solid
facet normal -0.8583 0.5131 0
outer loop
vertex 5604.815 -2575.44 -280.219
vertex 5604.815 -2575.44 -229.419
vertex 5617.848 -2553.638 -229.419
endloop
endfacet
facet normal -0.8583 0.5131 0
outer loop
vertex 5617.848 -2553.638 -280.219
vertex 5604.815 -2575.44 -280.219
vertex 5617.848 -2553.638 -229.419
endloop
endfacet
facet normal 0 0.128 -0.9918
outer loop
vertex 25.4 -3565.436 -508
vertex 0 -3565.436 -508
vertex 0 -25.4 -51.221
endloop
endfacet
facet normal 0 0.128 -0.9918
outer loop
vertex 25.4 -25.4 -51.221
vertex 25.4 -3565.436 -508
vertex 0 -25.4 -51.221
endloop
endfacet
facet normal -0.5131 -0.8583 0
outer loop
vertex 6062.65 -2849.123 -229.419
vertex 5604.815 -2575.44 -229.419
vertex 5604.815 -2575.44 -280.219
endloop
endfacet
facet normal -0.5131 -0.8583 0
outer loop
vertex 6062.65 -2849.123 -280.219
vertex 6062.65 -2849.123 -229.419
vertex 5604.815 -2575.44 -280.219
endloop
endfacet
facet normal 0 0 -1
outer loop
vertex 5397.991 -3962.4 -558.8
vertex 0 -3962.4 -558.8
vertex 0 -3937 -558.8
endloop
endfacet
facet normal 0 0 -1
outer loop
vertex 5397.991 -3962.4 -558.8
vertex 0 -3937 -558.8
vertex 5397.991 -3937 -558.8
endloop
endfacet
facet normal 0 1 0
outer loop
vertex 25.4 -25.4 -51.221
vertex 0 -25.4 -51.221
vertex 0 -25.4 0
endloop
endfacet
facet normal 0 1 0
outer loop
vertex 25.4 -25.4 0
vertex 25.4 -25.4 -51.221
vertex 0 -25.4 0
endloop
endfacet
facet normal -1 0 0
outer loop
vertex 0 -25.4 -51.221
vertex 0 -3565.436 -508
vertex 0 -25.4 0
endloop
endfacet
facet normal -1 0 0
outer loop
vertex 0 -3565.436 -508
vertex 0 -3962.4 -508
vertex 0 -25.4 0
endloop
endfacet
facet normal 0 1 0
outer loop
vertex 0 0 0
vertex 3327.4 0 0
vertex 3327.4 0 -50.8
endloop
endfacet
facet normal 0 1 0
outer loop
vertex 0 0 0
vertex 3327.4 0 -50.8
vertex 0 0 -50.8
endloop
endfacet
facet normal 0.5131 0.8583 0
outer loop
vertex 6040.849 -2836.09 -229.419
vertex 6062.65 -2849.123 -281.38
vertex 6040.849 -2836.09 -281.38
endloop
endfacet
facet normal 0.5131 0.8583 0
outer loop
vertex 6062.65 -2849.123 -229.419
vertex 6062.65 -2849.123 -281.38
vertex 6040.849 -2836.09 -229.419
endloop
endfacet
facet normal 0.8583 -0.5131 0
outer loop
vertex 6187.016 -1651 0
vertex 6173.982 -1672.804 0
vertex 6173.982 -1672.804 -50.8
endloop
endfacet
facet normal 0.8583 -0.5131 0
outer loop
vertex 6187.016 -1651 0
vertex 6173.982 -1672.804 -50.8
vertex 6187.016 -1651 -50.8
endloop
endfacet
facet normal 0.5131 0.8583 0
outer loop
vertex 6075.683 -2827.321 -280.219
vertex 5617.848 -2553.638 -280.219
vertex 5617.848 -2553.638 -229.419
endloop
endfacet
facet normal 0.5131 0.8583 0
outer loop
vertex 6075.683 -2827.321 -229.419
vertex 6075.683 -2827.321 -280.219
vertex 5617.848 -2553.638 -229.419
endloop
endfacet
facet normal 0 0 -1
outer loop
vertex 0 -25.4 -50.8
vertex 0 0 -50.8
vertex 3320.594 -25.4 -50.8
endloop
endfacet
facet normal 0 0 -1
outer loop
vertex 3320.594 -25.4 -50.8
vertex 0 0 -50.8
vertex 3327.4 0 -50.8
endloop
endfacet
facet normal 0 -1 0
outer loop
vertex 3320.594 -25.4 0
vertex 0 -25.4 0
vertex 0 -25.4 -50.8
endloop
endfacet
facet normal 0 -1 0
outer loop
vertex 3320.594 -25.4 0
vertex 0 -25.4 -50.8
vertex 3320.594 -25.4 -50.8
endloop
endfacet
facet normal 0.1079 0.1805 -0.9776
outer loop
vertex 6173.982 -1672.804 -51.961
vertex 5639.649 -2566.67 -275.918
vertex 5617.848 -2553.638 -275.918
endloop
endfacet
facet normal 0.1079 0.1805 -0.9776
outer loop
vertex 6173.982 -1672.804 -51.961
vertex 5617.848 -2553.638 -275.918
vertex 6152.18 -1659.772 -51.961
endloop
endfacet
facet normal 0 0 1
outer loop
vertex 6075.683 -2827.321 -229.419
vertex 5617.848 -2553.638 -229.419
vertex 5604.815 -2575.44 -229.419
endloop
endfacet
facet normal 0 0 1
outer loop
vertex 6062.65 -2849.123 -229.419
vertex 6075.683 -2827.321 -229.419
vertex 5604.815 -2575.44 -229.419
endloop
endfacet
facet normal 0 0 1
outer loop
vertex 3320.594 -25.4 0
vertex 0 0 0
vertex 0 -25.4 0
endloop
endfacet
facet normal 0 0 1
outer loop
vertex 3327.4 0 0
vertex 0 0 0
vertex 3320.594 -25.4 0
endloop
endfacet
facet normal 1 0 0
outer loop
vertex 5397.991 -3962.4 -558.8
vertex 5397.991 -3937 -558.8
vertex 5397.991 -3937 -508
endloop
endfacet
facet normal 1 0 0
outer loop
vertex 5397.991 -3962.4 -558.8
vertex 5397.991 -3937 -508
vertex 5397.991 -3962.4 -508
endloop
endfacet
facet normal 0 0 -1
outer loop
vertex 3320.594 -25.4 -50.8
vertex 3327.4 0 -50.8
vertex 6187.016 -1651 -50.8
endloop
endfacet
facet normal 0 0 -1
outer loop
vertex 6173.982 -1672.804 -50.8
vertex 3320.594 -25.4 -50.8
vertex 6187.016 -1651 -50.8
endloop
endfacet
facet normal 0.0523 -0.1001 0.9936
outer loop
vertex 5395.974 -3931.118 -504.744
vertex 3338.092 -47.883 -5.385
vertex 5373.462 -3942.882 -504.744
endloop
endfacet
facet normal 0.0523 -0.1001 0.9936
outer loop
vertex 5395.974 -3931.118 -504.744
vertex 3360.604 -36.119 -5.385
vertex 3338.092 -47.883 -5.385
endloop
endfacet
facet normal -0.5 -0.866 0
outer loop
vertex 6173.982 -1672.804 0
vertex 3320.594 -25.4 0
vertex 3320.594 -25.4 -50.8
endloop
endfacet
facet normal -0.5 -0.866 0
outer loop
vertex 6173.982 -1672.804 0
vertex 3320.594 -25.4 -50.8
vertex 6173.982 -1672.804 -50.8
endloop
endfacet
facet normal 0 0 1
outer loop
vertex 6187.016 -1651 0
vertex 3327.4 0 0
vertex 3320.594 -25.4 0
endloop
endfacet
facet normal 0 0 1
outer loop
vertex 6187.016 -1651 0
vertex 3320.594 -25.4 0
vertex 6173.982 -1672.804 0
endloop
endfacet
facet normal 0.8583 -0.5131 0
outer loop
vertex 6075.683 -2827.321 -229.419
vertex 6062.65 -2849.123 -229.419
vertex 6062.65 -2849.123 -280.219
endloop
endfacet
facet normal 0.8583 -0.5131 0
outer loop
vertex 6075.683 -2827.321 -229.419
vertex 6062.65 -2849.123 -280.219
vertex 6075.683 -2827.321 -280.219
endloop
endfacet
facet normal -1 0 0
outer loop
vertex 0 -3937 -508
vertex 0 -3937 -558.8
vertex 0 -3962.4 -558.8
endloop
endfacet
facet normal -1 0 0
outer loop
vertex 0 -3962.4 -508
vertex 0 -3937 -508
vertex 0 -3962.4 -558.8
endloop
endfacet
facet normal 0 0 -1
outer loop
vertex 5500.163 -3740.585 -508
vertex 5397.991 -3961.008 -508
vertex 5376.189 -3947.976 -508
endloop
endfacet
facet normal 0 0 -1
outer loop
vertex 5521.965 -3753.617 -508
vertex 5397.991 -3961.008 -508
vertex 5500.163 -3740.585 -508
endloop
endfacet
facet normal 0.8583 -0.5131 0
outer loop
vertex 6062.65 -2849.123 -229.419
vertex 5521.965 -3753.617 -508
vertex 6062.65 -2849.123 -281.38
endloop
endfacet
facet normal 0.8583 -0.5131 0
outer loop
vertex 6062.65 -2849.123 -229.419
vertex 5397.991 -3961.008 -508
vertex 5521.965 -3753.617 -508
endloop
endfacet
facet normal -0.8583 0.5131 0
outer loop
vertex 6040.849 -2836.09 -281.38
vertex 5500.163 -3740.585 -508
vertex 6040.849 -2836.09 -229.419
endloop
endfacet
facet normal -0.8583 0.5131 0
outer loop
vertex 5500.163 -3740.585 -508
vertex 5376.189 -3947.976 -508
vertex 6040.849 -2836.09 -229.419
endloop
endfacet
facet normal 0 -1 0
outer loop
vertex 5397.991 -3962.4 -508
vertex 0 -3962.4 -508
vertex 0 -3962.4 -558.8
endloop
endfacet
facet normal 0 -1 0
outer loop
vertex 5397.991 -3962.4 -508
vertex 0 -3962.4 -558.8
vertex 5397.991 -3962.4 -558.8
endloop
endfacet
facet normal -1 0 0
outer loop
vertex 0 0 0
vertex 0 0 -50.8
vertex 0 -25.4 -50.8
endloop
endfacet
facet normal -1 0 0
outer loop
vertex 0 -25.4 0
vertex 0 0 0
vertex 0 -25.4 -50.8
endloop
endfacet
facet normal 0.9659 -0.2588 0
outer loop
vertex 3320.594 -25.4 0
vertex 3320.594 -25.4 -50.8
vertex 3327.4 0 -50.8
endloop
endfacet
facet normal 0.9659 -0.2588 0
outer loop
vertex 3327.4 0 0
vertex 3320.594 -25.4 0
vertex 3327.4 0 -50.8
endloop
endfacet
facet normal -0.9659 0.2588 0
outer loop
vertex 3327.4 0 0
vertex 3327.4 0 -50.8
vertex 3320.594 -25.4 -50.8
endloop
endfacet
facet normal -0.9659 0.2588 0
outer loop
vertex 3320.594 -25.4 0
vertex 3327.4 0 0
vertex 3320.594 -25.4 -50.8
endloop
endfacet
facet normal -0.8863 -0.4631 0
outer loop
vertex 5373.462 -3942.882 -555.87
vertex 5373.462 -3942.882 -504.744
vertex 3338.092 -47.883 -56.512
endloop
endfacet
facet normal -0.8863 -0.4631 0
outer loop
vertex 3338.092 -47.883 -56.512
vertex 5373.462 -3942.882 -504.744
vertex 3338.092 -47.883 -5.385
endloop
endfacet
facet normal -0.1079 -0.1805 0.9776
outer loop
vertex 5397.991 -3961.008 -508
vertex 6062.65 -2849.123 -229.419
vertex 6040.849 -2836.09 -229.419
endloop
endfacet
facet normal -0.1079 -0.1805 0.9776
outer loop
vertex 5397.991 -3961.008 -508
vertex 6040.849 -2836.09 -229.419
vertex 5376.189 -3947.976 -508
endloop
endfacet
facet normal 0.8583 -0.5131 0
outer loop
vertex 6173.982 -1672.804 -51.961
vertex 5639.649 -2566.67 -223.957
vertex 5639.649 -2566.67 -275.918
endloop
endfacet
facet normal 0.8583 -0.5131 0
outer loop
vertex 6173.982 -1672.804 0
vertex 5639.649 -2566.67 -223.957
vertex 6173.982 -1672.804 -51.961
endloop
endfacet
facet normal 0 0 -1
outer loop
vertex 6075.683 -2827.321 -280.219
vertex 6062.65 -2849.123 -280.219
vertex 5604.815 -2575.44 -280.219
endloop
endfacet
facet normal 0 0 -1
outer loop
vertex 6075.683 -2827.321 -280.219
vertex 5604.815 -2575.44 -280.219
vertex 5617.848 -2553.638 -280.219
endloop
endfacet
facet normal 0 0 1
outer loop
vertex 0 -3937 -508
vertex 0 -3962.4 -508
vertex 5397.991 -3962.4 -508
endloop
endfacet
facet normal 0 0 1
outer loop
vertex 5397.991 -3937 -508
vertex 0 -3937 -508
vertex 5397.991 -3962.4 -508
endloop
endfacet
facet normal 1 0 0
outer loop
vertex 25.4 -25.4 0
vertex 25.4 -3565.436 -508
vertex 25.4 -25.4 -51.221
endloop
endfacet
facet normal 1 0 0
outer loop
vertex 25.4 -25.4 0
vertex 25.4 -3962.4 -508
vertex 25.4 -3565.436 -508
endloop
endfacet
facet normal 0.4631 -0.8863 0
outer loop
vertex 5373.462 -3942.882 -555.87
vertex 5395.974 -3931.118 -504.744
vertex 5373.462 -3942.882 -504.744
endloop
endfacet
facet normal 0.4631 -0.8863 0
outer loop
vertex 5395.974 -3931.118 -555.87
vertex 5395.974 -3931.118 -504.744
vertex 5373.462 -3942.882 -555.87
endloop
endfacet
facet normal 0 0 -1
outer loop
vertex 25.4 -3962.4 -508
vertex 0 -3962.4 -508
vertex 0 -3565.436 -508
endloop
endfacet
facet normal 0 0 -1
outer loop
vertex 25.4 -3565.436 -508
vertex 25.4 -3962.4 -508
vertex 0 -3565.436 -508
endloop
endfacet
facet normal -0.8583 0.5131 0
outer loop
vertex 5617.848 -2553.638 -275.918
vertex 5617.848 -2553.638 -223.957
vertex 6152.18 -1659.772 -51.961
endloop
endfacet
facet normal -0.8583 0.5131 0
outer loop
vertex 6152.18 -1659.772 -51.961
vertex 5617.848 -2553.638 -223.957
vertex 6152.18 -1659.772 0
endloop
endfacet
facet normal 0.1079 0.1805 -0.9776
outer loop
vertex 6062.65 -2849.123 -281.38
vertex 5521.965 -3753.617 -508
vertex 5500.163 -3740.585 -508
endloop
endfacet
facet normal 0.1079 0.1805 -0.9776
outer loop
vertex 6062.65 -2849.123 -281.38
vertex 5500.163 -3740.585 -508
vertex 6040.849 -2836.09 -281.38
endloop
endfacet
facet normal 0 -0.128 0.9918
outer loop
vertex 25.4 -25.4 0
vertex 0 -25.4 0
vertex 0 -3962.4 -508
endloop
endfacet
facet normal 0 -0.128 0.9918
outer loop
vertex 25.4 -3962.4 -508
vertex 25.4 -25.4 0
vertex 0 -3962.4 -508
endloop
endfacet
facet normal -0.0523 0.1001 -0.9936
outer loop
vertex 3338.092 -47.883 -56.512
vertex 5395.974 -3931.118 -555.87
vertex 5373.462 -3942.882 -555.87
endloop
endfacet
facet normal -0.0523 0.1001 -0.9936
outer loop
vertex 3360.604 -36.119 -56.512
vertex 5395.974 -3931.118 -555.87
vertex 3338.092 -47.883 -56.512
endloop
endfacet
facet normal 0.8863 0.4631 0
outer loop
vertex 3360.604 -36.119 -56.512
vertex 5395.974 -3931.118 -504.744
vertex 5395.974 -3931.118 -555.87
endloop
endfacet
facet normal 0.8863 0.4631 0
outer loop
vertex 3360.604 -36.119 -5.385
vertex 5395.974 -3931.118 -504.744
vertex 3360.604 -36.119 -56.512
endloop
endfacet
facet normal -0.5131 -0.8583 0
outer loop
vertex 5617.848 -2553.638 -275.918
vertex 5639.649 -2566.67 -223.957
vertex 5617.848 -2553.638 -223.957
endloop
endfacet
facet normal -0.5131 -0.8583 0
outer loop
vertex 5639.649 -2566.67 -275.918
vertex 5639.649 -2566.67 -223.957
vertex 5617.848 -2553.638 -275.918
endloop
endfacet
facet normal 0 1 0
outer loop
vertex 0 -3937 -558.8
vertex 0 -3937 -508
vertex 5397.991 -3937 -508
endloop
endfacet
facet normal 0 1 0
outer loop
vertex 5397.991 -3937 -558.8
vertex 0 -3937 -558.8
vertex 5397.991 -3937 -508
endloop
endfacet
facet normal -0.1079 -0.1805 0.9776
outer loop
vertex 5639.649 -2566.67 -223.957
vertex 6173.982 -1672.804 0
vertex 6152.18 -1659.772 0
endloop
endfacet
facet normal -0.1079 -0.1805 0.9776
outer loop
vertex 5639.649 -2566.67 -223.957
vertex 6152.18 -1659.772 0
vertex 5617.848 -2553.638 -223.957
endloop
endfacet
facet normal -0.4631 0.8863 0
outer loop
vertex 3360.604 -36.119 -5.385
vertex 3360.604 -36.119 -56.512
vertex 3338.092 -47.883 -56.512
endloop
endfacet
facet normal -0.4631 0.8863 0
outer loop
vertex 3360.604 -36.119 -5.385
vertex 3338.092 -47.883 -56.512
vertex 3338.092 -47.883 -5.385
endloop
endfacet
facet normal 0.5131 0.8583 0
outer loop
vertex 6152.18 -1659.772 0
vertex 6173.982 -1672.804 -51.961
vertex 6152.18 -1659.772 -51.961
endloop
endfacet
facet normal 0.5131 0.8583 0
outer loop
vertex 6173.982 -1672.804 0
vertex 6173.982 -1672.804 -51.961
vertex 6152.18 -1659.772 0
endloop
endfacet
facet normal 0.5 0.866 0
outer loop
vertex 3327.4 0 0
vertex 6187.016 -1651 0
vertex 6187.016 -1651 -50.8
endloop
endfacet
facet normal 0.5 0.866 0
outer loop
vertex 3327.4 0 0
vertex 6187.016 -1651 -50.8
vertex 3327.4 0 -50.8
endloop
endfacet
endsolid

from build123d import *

# Parameters (mm, degrees)
F1_DEPTH       = 50.8
F2_DEPTH       = 50.8
F4_DEPTH       = 25.4
F6_DEPTH       = 25.4
F7_DEPTH       = 508
F7_DEPTH_BACK  = 25.4
F9_DEPTH       = 25.4
F10_W          = 5397.9911712282
F10_H          = 25.4
F11_DEPTH      = 50.8
F14_DEPTH      = 12.7
F14_DEPTH_BACK = 12.7


with BuildPart() as f1:
    # F0 (on Top) → F1 (new body)
    with BuildSketch(Plane.XY):
        Polygon((3327.4, 0), (0, 0), (0, -25.4), (3320.5940905122, -25.4), align=None)
    extrude(amount=-F1_DEPTH)


with BuildPart() as f2:
    # F0 (on Top) → F2 (new body)
    with BuildSketch(Plane.XY):
        Polygon((6187.0158832962, -1651), (3327.4, 0), (3320.5940905122, -25.4), (6173.9818464705, -1672.8041890049), align=None)
    extrude(amount=-F2_DEPTH)


with BuildPart() as f4:
    # F3 (on Right) → F4 (new body)
    with BuildSketch(Plane.YZ):
        Polygon((-25.4, -50.8), (-25.4, 0), (-3962.4, -508), (-3565.4361099546, -508), (-25.4, -51.2211471026), align=None)
    extrude(amount=F4_DEPTH)


with BuildPart() as f6:
    # F5 (on face) → F6 (new body)
    with BuildSketch(Plane(origin=(5285.3087772257, -3159.43460324, 0), x_dir=(0.5130918999, 0.8583336777, 0), z_dir=(0.8583336777, -0.5130918999, 0))):
        Polygon((1731.9959043052, -50.8), (1731.9959043052, 0), (690.598832761, -223.9566371144), (690.598832761, -229.4190094775), (690.598832761, -275.9180655718), (1731.9959043052, -51.9614284574), align=None)
    extrude(amount=-F6_DEPTH)


with BuildPart() as f7:
    # F5 (on face) → F7 (new body, two sides)
    with BuildSketch(Plane(origin=(5285.3087772257, -3159.43460324, 0), x_dir=(0.5130918999, 0.8583336777, 0), z_dir=(0.8583336777, -0.5130918999, 0))) as f7_sk:
        Polygon((690.598832761, -275.9180655718), (690.598832761, -229.4190094775), (665.198832761, -229.4190094775), (665.198832761, -280.2190094775), (690.598832761, -280.2190094775), align=None)
    extrude(amount=F7_DEPTH)
    extrude(f7_sk.sketch, amount=-F7_DEPTH_BACK)


with BuildPart() as f9:
    # F8 (on face) → F9 (new body)
    with BuildSketch(Plane(origin=(5721.3422854773, -3420.0852884144, 0), x_dir=(0.5130918999, 0.8583336777, 0), z_dir=(0.8583336777, -0.5130918999, 0))):
        Polygon((665.198832761, -281.380437935), (665.198832761, -229.4190094775), (-630.201167239, -508), (-388.5808244528, -508), align=None)
    extrude(amount=-F9_DEPTH)


with BuildPart() as f11:
    # F10 (on face) → F11 (new body)
    with BuildSketch(Plane(origin=(0, 0, -508), x_dir=(1, 0, 0), z_dir=(0, 0, -1))):
        with Locations((2698.9955856141, 3949.7)):
            Rectangle(F10_W, F10_H)
    extrude(amount=F11_DEPTH)


with BuildPart() as f14:
    # F13 (on 3pt) → F14 (new body, two sides)
    with BuildSketch(Plane(origin=(2613.6843455731, 1365.8065138101, 0), x_dir=(-0.4631376686, 0.8862863532, 0), z_dir=(0.8862863532, 0.4631376686, 0))) as f14_sk:
        Polygon((-5983.1751832259, -504.7435897436), (-5983.1751832259, -555.8704766939), (-1588.4343132242, -56.5116486151), (-1588.4343132242, -5.3847616647), align=None)
    extrude(amount=F14_DEPTH)
    extrude(f14_sk.sketch, amount=-F14_DEPTH_BACK)


solid = Compound([f1.part, f2.part, f4.part, f6.part, f7.part, f9.part, f11.part, f14.part])
